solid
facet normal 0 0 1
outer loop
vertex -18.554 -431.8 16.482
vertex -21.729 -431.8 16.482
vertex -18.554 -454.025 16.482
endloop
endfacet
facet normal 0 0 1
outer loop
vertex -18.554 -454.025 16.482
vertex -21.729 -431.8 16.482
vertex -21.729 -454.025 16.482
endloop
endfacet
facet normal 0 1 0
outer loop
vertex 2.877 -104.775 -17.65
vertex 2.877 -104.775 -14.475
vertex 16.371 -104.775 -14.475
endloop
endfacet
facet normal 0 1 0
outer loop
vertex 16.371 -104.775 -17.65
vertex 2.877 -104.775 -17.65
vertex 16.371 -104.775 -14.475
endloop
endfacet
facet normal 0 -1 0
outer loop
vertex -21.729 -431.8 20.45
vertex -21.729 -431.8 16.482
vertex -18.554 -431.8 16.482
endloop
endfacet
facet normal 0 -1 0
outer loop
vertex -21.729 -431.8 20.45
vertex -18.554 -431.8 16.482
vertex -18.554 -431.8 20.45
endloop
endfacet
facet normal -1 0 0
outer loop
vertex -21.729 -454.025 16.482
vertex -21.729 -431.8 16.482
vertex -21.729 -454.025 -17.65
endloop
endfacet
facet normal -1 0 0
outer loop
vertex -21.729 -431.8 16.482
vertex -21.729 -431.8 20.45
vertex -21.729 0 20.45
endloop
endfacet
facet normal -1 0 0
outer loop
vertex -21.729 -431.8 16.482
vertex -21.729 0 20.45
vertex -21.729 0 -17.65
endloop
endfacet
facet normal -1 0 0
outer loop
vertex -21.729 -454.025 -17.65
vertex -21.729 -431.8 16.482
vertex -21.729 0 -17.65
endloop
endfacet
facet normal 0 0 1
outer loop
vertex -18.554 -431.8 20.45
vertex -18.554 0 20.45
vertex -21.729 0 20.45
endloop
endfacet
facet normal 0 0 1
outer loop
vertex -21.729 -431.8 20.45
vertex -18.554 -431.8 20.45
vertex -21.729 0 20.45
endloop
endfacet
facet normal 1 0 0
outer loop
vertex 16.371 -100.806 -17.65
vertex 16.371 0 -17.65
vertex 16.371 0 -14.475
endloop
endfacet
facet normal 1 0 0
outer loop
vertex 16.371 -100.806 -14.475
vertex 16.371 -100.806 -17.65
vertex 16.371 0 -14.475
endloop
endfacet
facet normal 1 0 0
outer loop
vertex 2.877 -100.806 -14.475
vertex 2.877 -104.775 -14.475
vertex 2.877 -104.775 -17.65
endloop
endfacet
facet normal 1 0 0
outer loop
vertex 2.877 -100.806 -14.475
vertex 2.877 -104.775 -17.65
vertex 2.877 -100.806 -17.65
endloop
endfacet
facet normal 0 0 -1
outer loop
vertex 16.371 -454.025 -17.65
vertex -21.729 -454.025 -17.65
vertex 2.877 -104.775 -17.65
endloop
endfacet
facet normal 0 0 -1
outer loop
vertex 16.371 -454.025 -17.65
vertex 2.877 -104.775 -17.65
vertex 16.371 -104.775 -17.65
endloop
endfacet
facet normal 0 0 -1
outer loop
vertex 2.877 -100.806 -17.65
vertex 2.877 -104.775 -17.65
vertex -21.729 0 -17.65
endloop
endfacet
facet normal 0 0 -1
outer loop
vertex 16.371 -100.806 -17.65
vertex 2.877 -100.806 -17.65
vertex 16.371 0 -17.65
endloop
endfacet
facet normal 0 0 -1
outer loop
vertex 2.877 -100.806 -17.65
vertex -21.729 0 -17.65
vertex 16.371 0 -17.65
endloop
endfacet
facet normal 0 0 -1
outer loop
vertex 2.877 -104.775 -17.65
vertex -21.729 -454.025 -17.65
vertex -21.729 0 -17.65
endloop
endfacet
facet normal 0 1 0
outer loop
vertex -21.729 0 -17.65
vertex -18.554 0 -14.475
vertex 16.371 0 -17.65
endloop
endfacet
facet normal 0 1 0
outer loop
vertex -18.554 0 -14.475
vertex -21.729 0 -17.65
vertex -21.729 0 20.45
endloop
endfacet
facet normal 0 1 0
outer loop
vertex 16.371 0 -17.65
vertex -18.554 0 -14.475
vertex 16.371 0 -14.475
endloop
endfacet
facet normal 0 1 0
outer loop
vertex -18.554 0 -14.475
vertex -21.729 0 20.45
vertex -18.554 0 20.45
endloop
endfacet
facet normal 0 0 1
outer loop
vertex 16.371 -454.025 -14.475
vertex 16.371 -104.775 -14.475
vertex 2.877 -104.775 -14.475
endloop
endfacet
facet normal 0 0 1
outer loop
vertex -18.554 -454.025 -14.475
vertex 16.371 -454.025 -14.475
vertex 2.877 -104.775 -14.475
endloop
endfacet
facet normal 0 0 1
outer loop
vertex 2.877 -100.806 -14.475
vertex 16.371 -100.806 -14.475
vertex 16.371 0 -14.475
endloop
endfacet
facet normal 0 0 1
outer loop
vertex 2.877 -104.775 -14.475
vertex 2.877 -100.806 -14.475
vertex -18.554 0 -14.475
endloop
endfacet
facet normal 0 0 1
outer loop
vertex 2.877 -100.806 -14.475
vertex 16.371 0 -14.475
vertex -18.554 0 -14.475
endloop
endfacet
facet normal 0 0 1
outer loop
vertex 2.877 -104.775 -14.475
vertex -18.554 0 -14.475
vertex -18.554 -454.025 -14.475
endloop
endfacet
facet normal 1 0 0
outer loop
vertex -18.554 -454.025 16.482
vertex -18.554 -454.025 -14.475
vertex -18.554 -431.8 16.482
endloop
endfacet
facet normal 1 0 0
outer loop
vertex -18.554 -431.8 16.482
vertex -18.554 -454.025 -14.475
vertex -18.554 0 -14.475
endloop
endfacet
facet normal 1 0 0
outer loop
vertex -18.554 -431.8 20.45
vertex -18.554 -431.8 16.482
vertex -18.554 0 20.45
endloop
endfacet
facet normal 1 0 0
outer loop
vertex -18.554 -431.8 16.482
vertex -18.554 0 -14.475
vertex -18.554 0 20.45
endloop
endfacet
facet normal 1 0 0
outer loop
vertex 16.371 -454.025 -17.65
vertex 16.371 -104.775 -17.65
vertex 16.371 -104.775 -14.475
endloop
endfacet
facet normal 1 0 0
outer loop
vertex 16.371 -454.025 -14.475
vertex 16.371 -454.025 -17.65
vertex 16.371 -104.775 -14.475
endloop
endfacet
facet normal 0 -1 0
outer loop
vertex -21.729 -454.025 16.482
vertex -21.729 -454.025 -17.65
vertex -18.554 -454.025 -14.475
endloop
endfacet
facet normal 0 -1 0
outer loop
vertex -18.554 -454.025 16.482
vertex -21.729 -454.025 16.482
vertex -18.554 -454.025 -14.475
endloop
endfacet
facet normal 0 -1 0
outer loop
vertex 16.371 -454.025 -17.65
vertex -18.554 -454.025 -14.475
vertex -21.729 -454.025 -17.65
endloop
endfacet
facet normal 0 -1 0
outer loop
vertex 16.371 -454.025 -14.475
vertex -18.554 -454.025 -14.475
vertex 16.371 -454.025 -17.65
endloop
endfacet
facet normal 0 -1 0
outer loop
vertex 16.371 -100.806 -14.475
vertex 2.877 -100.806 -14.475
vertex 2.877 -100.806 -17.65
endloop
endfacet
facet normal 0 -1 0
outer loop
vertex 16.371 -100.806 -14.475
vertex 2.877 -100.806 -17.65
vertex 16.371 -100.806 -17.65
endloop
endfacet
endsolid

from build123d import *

# Parameters (mm, degrees)
F1_DEPTH = 454.025
F3_W     = 22.225
F3_H     = 3.96875
F4_DEPTH = 25.4
F5_W     = 13.49375
F5_H     = 3.96875
F6_DEPTH = 25.4


with BuildPart() as f1:
    # F0 (on Front) → F1 (new body)
    with BuildSketch(Plane.XZ):
        Polygon((-18.553972, 20.450408), (-21.728972, 20.450408), (-21.728972, -17.649592), (16.371028, -17.649592), (16.371028, -14.474592), (-18.553972, -14.474592), align=None)
    extrude(amount=F1_DEPTH)

    # F3 (on face) → F4 (cut)
    with BuildSketch(Plane(origin=(-21.728972, 0, 0), x_dir=(0, -1, 0), z_dir=(-1, 0, 0))):
        with Locations((442.9125, 18.466033)):
            Rectangle(F3_W, F3_H)
    extrude(amount=-F4_DEPTH, mode=Mode.SUBTRACT)

    # F5 (on face) → F6 (cut)
    with BuildSketch(Plane.XY.offset(-14.474592)):
        with Locations((9.624153, -102.790625)):
            Rectangle(F5_W, F5_H)
    extrude(amount=-F6_DEPTH, mode=Mode.SUBTRACT)


solid = f1.part
